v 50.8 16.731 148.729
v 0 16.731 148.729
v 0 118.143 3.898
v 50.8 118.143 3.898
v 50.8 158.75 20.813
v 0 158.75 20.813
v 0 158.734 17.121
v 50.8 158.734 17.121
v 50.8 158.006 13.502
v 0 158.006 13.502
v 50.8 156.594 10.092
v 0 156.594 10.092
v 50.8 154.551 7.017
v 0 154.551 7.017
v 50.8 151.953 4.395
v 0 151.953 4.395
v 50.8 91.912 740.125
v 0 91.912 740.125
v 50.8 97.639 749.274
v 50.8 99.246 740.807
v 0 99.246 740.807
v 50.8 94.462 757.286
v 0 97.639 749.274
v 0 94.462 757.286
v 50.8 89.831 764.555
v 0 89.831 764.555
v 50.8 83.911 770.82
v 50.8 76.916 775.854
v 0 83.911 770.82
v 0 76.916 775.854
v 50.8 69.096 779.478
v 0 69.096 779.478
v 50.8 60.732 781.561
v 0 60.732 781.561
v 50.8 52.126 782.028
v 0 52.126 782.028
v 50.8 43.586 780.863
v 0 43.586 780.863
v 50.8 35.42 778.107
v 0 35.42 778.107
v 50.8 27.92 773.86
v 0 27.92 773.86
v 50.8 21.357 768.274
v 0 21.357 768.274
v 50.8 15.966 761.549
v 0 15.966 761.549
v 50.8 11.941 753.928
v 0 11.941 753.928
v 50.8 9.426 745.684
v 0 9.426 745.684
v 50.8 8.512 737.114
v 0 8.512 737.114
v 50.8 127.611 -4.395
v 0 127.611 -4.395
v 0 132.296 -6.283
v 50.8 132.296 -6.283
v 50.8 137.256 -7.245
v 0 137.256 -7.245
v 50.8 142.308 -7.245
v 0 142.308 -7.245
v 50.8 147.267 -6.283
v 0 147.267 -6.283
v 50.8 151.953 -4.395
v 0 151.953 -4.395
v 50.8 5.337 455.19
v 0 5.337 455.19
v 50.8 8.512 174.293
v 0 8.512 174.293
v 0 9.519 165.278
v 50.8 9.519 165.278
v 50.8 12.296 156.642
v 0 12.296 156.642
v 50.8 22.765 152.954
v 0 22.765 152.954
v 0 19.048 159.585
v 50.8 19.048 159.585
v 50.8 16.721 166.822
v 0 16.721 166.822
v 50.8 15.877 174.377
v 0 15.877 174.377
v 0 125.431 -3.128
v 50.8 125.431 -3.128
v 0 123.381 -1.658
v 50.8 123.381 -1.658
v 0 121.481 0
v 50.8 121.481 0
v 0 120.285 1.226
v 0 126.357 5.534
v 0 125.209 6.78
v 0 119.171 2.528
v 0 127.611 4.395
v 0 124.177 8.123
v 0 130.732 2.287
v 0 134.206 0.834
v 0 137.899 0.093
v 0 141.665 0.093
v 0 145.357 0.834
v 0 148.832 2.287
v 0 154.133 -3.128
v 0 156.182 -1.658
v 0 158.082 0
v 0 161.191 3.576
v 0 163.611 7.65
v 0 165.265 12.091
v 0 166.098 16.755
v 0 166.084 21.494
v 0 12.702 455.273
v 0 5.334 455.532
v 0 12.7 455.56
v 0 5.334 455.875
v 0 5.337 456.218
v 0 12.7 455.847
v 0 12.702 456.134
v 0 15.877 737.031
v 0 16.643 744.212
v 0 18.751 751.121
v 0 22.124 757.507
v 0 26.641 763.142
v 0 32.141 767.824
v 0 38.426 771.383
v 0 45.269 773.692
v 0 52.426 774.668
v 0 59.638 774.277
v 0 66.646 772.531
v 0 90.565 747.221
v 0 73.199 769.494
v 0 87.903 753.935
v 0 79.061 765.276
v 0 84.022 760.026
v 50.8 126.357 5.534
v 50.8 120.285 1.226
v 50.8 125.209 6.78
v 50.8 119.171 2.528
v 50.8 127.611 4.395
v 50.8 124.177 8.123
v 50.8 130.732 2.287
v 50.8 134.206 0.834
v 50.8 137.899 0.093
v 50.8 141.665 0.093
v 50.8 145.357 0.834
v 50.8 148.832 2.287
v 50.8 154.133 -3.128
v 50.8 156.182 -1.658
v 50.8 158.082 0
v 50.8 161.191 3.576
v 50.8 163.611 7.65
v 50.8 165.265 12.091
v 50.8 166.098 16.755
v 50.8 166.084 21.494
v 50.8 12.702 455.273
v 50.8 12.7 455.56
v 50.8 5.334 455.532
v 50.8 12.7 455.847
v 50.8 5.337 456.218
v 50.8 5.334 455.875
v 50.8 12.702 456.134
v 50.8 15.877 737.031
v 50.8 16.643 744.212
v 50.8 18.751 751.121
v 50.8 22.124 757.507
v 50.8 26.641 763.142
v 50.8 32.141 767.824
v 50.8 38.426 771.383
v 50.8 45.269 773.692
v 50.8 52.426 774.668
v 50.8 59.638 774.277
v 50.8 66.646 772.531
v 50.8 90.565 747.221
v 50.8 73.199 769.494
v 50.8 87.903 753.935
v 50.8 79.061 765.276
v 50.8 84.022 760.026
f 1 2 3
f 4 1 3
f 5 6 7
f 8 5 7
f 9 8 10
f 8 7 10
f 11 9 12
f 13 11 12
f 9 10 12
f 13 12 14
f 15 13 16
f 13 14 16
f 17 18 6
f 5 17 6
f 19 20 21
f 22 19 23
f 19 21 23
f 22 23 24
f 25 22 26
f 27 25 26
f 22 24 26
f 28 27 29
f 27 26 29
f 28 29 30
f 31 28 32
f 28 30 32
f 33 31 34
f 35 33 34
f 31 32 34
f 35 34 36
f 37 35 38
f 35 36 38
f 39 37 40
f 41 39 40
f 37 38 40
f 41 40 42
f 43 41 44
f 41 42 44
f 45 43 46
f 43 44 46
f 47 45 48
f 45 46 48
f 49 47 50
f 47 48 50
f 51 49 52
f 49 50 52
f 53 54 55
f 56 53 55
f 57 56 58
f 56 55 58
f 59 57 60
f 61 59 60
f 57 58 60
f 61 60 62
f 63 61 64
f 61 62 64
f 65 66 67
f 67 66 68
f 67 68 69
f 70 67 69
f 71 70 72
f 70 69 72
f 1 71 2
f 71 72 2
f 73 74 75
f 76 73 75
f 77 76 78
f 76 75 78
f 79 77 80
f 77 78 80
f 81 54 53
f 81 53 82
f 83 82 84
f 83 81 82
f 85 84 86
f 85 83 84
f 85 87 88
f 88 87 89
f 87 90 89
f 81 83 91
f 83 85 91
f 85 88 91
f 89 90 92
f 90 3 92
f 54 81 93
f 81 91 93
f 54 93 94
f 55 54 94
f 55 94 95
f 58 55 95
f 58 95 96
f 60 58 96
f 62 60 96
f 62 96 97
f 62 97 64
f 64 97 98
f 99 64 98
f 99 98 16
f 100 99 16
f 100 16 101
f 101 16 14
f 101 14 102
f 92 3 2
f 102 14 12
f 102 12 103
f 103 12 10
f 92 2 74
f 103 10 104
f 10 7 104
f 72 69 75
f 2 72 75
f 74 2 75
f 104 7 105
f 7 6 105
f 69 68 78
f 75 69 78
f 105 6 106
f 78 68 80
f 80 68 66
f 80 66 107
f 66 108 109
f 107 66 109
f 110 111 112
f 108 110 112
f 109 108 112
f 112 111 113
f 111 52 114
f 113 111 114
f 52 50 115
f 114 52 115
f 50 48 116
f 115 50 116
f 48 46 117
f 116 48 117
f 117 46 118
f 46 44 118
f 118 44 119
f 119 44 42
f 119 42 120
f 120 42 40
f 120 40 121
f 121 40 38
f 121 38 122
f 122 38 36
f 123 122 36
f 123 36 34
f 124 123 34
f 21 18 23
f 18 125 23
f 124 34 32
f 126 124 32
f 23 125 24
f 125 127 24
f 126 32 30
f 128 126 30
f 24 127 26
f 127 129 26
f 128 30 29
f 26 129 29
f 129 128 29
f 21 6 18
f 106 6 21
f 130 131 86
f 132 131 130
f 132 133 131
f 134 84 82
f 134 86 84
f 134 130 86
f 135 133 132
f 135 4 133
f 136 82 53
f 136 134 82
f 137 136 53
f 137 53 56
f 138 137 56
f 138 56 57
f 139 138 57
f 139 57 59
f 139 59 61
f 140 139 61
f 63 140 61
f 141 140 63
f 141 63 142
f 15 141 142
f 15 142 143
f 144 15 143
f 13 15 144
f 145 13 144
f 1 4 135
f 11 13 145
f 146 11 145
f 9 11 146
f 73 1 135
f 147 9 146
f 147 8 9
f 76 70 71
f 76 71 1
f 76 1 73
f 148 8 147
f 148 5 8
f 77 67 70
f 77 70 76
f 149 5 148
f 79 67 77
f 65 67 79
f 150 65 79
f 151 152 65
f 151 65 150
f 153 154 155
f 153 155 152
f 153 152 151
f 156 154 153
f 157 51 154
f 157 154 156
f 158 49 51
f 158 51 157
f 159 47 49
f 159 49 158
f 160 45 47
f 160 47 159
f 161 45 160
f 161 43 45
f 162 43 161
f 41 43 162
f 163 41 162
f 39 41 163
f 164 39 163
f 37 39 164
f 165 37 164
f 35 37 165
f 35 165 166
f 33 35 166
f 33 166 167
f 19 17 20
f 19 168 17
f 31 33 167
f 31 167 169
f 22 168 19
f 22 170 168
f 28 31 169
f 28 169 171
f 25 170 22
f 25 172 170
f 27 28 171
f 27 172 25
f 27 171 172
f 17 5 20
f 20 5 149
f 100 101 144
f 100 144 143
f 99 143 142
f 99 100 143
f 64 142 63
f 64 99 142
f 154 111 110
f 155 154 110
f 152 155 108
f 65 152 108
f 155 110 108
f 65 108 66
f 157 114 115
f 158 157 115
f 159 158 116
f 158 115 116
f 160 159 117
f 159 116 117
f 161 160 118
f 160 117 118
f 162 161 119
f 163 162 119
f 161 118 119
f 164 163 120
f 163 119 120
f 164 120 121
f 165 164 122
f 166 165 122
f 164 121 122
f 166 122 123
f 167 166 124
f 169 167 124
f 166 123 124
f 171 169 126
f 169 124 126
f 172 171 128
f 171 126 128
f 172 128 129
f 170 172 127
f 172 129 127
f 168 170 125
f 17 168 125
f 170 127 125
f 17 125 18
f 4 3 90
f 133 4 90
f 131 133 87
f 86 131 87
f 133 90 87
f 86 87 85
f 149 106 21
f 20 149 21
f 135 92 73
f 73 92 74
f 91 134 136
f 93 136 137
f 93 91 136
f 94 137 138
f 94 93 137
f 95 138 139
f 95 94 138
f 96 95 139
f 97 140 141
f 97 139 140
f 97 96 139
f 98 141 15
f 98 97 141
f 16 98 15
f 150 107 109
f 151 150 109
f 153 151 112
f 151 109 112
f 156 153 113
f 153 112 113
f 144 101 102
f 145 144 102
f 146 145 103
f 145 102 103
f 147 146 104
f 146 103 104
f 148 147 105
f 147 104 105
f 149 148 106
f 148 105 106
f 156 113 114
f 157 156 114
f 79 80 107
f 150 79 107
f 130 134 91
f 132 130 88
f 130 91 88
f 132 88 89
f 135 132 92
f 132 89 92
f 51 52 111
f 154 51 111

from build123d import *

# Parameters (mm, degrees)
EXTRUDE_THIN1_DEPTH     = 50.8
BODY_MOVE_COPY1_DEPTH   = 50.8
BODY_MOVE_COPY1_2_DEPTH = 50.8


# Read off the part's stored shape, not the designer's step: Body-Move/Copy1
with BuildPart() as part:
    # Sketch1 → Extrude-Thin1 (new body)
    with BuildSketch(Plane(origin=(0, 0, 0), x_dir=(0, 0, -1), z_dir=(1, 0, 0))):
        with BuildLine():
            Line((21.494042733, 166.084405055), (740.806573551, 99.245982925))
            ThreePointArc((740.806573551, 99.245982925), (782.028393343, 52.126153258), (737.113874036, 8.511904093))
            Line((737.113874036, 8.511904093), (456.21754645, 5.336904093))
            ThreePointArc((456.21754645, 5.336904093), (455.703672415, 5.334), (455.189798379, 5.336904093))
            Line((455.189798379, 5.336904093), (174.293470793, 8.511904093))
            ThreePointArc((174.293470793, 8.511904093), (160.890624168, 10.691261229), (148.729118574, 16.731433154))
            Line((148.729118574, 16.731433154), (3.898404857, 118.142990663))
            ThreePointArc((3.898404857, 118.142990663), (-5.748493412, 148.883347208), (21.494042733, 166.084405055))
        make_face()
        with BuildLine():
            Line((20.812530817, 158.75), (740.125061635, 91.91157787))
            ThreePointArc((740.125061635, 91.91157787), (774.668486042, 52.425687087), (737.0306207, 15.877433597))
            Line((737.0306207, 15.877433597), (456.134293115, 12.702433597))
            ThreePointArc((456.134293115, 12.702433597), (455.703672415, 12.7), (455.273051714, 12.702433597))
            Line((455.273051714, 12.702433597), (174.376724129, 15.877433597))
            ThreePointArc((174.376724129, 15.877433597), (163.145288409, 17.703710527), (152.954082604, 22.765307113))
            Line((152.954082604, 22.765307113), (8.123368888, 124.176864621))
            ThreePointArc((8.123368888, 124.176864621), (1.166471097, 146.345390976), (20.812530817, 158.75))
        make_face(mode=Mode.SUBTRACT)
    extrude(amount=EXTRUDE_THIN1_DEPTH)

    # Body-Move/Copy1 outline → Body-Move/Copy1 (cut)
    with BuildSketch(Plane.YZ):
        with BuildLine():
            ThreePointArc((166.084405055, -21.494042733), (164.537643621, -9.833229454), (158.082054122, 0))
            ThreePointArc((158.082054122, 0), (155.175079711, -2.417399882), (151.952776868, -4.395046666))
            ThreePointArc((151.952776868, -4.395046666), (157.382799095, -11.762737128), (158.75, -20.812530817))
            Line((158.75, -20.812530817), (91.91157787, -740.125061635))
            ThreePointArc((91.91157787, -740.125061635), (52.425687087, -774.668486042), (15.877433597, -737.0306207))
            Line((15.877433597, -737.0306207), (12.702433597, -456.134293115))
            ThreePointArc((12.702433597, -456.134293115), (12.7, -455.703672414), (12.702433597, -455.273051714))
            Line((12.702433597, -455.273051714), (15.877433597, -174.376724129))
            ThreePointArc((15.877433597, -174.376724129), (17.703710527, -163.145288409), (22.765307113, -152.954082604))
            Line((22.765307113, -152.954082604), (124.176864621, -8.123368888))
            ThreePointArc((124.176864621, -8.123368888), (125.769201584, -6.144494274), (127.610645261, -4.395046667))
            ThreePointArc((127.610645261, -4.395046667), (124.388342418, -2.417399882), (121.481368008, 0))
            ThreePointArc((121.481368008, 0), (119.717275174, -1.867931777), (118.142990663, -3.898404857))
            Line((118.142990663, -3.898404857), (16.731433154, -148.729118574))
            ThreePointArc((16.731433154, -148.729118574), (10.691261229, -160.890624168), (8.511904093, -174.293470793))
            Line((8.511904093, -174.293470793), (5.336904093, -455.189798379))
            ThreePointArc((5.336904093, -455.189798379), (5.334, -455.703672415), (5.336904093, -456.21754645))
            Line((5.336904093, -456.21754645), (8.511904093, -737.113874036))
            ThreePointArc((8.511904093, -737.113874036), (52.126153258, -782.028393343), (99.245982925, -740.806573551))
            Line((99.245982925, -740.806573551), (166.084405055, -21.494042733))
        make_face()
        with BuildLine():
            ThreePointArc((127.610645261, 4.395046667), (139.781711065, 0), (151.952776868, 4.395046666))
            ThreePointArc((151.952776868, 4.395046666), (139.781711065, 7.366), (127.610645261, 4.395046667))
        make_face()
    extrude(amount=BODY_MOVE_COPY1_DEPTH, mode=Mode.SUBTRACT)

    # Body-Move_Copy1 2 outline → Body-Move_Copy1 2 (add)
    with BuildSketch(Plane.YZ):
        with BuildLine():
            ThreePointArc((158.082054122, 0), (164.537643621, 9.833229454), (166.084405055, 21.494042733))
            Line((166.084405055, 21.494042733), (99.245982925, 740.806573551))
            ThreePointArc((99.245982925, 740.806573551), (52.126153258, 782.028393343), (8.511904093, 737.113874036))
            Line((8.511904093, 737.113874036), (5.336904093, 456.21754645))
            ThreePointArc((5.336904093, 456.21754645), (5.334, 455.703672415), (5.336904093, 455.189798379))
            Line((5.336904093, 455.189798379), (8.511904093, 174.293470793))
            ThreePointArc((8.511904093, 174.293470793), (10.691261229, 160.890624168), (16.731433154, 148.729118574))
            Line((16.731433154, 148.729118574), (118.142990663, 3.898404857))
            ThreePointArc((118.142990663, 3.898404857), (119.717275174, 1.867931777), (121.481368008, 0))
            ThreePointArc((121.481368008, 0), (124.388342418, 2.417399882), (127.610645261, 4.395046667))
            ThreePointArc((127.610645261, 4.395046667), (125.769201584, 6.144494274), (124.176864621, 8.123368888))
            Line((124.176864621, 8.123368888), (22.765307113, 152.954082604))
            ThreePointArc((22.765307113, 152.954082604), (17.703710527, 163.145288409), (15.877433597, 174.376724129))
            Line((15.877433597, 174.376724129), (12.702433597, 455.273051714))
            ThreePointArc((12.702433597, 455.273051714), (12.7, 455.703672415), (12.702433597, 456.134293115))
            Line((12.702433597, 456.134293115), (15.877433597, 737.0306207))
            ThreePointArc((15.877433597, 737.0306207), (52.425687087, 774.668486042), (91.91157787, 740.125061635))
            Line((91.91157787, 740.125061635), (158.75, 20.812530817))
            ThreePointArc((158.75, 20.812530817), (157.382799095, 11.762737128), (151.952776868, 4.395046666))
            ThreePointArc((151.952776868, 4.395046666), (155.175079711, 2.417399882), (158.082054122, 0))
        make_face()
        with BuildLine():
            ThreePointArc((127.610645261, -4.395046667), (139.781711065, -7.366), (151.952776868, -4.395046666))
            ThreePointArc((151.952776868, -4.395046666), (139.781711065, 0), (127.610645261, -4.395046667))
        make_face()
    extrude(amount=BODY_MOVE_COPY1_2_DEPTH)


solid = part.part
